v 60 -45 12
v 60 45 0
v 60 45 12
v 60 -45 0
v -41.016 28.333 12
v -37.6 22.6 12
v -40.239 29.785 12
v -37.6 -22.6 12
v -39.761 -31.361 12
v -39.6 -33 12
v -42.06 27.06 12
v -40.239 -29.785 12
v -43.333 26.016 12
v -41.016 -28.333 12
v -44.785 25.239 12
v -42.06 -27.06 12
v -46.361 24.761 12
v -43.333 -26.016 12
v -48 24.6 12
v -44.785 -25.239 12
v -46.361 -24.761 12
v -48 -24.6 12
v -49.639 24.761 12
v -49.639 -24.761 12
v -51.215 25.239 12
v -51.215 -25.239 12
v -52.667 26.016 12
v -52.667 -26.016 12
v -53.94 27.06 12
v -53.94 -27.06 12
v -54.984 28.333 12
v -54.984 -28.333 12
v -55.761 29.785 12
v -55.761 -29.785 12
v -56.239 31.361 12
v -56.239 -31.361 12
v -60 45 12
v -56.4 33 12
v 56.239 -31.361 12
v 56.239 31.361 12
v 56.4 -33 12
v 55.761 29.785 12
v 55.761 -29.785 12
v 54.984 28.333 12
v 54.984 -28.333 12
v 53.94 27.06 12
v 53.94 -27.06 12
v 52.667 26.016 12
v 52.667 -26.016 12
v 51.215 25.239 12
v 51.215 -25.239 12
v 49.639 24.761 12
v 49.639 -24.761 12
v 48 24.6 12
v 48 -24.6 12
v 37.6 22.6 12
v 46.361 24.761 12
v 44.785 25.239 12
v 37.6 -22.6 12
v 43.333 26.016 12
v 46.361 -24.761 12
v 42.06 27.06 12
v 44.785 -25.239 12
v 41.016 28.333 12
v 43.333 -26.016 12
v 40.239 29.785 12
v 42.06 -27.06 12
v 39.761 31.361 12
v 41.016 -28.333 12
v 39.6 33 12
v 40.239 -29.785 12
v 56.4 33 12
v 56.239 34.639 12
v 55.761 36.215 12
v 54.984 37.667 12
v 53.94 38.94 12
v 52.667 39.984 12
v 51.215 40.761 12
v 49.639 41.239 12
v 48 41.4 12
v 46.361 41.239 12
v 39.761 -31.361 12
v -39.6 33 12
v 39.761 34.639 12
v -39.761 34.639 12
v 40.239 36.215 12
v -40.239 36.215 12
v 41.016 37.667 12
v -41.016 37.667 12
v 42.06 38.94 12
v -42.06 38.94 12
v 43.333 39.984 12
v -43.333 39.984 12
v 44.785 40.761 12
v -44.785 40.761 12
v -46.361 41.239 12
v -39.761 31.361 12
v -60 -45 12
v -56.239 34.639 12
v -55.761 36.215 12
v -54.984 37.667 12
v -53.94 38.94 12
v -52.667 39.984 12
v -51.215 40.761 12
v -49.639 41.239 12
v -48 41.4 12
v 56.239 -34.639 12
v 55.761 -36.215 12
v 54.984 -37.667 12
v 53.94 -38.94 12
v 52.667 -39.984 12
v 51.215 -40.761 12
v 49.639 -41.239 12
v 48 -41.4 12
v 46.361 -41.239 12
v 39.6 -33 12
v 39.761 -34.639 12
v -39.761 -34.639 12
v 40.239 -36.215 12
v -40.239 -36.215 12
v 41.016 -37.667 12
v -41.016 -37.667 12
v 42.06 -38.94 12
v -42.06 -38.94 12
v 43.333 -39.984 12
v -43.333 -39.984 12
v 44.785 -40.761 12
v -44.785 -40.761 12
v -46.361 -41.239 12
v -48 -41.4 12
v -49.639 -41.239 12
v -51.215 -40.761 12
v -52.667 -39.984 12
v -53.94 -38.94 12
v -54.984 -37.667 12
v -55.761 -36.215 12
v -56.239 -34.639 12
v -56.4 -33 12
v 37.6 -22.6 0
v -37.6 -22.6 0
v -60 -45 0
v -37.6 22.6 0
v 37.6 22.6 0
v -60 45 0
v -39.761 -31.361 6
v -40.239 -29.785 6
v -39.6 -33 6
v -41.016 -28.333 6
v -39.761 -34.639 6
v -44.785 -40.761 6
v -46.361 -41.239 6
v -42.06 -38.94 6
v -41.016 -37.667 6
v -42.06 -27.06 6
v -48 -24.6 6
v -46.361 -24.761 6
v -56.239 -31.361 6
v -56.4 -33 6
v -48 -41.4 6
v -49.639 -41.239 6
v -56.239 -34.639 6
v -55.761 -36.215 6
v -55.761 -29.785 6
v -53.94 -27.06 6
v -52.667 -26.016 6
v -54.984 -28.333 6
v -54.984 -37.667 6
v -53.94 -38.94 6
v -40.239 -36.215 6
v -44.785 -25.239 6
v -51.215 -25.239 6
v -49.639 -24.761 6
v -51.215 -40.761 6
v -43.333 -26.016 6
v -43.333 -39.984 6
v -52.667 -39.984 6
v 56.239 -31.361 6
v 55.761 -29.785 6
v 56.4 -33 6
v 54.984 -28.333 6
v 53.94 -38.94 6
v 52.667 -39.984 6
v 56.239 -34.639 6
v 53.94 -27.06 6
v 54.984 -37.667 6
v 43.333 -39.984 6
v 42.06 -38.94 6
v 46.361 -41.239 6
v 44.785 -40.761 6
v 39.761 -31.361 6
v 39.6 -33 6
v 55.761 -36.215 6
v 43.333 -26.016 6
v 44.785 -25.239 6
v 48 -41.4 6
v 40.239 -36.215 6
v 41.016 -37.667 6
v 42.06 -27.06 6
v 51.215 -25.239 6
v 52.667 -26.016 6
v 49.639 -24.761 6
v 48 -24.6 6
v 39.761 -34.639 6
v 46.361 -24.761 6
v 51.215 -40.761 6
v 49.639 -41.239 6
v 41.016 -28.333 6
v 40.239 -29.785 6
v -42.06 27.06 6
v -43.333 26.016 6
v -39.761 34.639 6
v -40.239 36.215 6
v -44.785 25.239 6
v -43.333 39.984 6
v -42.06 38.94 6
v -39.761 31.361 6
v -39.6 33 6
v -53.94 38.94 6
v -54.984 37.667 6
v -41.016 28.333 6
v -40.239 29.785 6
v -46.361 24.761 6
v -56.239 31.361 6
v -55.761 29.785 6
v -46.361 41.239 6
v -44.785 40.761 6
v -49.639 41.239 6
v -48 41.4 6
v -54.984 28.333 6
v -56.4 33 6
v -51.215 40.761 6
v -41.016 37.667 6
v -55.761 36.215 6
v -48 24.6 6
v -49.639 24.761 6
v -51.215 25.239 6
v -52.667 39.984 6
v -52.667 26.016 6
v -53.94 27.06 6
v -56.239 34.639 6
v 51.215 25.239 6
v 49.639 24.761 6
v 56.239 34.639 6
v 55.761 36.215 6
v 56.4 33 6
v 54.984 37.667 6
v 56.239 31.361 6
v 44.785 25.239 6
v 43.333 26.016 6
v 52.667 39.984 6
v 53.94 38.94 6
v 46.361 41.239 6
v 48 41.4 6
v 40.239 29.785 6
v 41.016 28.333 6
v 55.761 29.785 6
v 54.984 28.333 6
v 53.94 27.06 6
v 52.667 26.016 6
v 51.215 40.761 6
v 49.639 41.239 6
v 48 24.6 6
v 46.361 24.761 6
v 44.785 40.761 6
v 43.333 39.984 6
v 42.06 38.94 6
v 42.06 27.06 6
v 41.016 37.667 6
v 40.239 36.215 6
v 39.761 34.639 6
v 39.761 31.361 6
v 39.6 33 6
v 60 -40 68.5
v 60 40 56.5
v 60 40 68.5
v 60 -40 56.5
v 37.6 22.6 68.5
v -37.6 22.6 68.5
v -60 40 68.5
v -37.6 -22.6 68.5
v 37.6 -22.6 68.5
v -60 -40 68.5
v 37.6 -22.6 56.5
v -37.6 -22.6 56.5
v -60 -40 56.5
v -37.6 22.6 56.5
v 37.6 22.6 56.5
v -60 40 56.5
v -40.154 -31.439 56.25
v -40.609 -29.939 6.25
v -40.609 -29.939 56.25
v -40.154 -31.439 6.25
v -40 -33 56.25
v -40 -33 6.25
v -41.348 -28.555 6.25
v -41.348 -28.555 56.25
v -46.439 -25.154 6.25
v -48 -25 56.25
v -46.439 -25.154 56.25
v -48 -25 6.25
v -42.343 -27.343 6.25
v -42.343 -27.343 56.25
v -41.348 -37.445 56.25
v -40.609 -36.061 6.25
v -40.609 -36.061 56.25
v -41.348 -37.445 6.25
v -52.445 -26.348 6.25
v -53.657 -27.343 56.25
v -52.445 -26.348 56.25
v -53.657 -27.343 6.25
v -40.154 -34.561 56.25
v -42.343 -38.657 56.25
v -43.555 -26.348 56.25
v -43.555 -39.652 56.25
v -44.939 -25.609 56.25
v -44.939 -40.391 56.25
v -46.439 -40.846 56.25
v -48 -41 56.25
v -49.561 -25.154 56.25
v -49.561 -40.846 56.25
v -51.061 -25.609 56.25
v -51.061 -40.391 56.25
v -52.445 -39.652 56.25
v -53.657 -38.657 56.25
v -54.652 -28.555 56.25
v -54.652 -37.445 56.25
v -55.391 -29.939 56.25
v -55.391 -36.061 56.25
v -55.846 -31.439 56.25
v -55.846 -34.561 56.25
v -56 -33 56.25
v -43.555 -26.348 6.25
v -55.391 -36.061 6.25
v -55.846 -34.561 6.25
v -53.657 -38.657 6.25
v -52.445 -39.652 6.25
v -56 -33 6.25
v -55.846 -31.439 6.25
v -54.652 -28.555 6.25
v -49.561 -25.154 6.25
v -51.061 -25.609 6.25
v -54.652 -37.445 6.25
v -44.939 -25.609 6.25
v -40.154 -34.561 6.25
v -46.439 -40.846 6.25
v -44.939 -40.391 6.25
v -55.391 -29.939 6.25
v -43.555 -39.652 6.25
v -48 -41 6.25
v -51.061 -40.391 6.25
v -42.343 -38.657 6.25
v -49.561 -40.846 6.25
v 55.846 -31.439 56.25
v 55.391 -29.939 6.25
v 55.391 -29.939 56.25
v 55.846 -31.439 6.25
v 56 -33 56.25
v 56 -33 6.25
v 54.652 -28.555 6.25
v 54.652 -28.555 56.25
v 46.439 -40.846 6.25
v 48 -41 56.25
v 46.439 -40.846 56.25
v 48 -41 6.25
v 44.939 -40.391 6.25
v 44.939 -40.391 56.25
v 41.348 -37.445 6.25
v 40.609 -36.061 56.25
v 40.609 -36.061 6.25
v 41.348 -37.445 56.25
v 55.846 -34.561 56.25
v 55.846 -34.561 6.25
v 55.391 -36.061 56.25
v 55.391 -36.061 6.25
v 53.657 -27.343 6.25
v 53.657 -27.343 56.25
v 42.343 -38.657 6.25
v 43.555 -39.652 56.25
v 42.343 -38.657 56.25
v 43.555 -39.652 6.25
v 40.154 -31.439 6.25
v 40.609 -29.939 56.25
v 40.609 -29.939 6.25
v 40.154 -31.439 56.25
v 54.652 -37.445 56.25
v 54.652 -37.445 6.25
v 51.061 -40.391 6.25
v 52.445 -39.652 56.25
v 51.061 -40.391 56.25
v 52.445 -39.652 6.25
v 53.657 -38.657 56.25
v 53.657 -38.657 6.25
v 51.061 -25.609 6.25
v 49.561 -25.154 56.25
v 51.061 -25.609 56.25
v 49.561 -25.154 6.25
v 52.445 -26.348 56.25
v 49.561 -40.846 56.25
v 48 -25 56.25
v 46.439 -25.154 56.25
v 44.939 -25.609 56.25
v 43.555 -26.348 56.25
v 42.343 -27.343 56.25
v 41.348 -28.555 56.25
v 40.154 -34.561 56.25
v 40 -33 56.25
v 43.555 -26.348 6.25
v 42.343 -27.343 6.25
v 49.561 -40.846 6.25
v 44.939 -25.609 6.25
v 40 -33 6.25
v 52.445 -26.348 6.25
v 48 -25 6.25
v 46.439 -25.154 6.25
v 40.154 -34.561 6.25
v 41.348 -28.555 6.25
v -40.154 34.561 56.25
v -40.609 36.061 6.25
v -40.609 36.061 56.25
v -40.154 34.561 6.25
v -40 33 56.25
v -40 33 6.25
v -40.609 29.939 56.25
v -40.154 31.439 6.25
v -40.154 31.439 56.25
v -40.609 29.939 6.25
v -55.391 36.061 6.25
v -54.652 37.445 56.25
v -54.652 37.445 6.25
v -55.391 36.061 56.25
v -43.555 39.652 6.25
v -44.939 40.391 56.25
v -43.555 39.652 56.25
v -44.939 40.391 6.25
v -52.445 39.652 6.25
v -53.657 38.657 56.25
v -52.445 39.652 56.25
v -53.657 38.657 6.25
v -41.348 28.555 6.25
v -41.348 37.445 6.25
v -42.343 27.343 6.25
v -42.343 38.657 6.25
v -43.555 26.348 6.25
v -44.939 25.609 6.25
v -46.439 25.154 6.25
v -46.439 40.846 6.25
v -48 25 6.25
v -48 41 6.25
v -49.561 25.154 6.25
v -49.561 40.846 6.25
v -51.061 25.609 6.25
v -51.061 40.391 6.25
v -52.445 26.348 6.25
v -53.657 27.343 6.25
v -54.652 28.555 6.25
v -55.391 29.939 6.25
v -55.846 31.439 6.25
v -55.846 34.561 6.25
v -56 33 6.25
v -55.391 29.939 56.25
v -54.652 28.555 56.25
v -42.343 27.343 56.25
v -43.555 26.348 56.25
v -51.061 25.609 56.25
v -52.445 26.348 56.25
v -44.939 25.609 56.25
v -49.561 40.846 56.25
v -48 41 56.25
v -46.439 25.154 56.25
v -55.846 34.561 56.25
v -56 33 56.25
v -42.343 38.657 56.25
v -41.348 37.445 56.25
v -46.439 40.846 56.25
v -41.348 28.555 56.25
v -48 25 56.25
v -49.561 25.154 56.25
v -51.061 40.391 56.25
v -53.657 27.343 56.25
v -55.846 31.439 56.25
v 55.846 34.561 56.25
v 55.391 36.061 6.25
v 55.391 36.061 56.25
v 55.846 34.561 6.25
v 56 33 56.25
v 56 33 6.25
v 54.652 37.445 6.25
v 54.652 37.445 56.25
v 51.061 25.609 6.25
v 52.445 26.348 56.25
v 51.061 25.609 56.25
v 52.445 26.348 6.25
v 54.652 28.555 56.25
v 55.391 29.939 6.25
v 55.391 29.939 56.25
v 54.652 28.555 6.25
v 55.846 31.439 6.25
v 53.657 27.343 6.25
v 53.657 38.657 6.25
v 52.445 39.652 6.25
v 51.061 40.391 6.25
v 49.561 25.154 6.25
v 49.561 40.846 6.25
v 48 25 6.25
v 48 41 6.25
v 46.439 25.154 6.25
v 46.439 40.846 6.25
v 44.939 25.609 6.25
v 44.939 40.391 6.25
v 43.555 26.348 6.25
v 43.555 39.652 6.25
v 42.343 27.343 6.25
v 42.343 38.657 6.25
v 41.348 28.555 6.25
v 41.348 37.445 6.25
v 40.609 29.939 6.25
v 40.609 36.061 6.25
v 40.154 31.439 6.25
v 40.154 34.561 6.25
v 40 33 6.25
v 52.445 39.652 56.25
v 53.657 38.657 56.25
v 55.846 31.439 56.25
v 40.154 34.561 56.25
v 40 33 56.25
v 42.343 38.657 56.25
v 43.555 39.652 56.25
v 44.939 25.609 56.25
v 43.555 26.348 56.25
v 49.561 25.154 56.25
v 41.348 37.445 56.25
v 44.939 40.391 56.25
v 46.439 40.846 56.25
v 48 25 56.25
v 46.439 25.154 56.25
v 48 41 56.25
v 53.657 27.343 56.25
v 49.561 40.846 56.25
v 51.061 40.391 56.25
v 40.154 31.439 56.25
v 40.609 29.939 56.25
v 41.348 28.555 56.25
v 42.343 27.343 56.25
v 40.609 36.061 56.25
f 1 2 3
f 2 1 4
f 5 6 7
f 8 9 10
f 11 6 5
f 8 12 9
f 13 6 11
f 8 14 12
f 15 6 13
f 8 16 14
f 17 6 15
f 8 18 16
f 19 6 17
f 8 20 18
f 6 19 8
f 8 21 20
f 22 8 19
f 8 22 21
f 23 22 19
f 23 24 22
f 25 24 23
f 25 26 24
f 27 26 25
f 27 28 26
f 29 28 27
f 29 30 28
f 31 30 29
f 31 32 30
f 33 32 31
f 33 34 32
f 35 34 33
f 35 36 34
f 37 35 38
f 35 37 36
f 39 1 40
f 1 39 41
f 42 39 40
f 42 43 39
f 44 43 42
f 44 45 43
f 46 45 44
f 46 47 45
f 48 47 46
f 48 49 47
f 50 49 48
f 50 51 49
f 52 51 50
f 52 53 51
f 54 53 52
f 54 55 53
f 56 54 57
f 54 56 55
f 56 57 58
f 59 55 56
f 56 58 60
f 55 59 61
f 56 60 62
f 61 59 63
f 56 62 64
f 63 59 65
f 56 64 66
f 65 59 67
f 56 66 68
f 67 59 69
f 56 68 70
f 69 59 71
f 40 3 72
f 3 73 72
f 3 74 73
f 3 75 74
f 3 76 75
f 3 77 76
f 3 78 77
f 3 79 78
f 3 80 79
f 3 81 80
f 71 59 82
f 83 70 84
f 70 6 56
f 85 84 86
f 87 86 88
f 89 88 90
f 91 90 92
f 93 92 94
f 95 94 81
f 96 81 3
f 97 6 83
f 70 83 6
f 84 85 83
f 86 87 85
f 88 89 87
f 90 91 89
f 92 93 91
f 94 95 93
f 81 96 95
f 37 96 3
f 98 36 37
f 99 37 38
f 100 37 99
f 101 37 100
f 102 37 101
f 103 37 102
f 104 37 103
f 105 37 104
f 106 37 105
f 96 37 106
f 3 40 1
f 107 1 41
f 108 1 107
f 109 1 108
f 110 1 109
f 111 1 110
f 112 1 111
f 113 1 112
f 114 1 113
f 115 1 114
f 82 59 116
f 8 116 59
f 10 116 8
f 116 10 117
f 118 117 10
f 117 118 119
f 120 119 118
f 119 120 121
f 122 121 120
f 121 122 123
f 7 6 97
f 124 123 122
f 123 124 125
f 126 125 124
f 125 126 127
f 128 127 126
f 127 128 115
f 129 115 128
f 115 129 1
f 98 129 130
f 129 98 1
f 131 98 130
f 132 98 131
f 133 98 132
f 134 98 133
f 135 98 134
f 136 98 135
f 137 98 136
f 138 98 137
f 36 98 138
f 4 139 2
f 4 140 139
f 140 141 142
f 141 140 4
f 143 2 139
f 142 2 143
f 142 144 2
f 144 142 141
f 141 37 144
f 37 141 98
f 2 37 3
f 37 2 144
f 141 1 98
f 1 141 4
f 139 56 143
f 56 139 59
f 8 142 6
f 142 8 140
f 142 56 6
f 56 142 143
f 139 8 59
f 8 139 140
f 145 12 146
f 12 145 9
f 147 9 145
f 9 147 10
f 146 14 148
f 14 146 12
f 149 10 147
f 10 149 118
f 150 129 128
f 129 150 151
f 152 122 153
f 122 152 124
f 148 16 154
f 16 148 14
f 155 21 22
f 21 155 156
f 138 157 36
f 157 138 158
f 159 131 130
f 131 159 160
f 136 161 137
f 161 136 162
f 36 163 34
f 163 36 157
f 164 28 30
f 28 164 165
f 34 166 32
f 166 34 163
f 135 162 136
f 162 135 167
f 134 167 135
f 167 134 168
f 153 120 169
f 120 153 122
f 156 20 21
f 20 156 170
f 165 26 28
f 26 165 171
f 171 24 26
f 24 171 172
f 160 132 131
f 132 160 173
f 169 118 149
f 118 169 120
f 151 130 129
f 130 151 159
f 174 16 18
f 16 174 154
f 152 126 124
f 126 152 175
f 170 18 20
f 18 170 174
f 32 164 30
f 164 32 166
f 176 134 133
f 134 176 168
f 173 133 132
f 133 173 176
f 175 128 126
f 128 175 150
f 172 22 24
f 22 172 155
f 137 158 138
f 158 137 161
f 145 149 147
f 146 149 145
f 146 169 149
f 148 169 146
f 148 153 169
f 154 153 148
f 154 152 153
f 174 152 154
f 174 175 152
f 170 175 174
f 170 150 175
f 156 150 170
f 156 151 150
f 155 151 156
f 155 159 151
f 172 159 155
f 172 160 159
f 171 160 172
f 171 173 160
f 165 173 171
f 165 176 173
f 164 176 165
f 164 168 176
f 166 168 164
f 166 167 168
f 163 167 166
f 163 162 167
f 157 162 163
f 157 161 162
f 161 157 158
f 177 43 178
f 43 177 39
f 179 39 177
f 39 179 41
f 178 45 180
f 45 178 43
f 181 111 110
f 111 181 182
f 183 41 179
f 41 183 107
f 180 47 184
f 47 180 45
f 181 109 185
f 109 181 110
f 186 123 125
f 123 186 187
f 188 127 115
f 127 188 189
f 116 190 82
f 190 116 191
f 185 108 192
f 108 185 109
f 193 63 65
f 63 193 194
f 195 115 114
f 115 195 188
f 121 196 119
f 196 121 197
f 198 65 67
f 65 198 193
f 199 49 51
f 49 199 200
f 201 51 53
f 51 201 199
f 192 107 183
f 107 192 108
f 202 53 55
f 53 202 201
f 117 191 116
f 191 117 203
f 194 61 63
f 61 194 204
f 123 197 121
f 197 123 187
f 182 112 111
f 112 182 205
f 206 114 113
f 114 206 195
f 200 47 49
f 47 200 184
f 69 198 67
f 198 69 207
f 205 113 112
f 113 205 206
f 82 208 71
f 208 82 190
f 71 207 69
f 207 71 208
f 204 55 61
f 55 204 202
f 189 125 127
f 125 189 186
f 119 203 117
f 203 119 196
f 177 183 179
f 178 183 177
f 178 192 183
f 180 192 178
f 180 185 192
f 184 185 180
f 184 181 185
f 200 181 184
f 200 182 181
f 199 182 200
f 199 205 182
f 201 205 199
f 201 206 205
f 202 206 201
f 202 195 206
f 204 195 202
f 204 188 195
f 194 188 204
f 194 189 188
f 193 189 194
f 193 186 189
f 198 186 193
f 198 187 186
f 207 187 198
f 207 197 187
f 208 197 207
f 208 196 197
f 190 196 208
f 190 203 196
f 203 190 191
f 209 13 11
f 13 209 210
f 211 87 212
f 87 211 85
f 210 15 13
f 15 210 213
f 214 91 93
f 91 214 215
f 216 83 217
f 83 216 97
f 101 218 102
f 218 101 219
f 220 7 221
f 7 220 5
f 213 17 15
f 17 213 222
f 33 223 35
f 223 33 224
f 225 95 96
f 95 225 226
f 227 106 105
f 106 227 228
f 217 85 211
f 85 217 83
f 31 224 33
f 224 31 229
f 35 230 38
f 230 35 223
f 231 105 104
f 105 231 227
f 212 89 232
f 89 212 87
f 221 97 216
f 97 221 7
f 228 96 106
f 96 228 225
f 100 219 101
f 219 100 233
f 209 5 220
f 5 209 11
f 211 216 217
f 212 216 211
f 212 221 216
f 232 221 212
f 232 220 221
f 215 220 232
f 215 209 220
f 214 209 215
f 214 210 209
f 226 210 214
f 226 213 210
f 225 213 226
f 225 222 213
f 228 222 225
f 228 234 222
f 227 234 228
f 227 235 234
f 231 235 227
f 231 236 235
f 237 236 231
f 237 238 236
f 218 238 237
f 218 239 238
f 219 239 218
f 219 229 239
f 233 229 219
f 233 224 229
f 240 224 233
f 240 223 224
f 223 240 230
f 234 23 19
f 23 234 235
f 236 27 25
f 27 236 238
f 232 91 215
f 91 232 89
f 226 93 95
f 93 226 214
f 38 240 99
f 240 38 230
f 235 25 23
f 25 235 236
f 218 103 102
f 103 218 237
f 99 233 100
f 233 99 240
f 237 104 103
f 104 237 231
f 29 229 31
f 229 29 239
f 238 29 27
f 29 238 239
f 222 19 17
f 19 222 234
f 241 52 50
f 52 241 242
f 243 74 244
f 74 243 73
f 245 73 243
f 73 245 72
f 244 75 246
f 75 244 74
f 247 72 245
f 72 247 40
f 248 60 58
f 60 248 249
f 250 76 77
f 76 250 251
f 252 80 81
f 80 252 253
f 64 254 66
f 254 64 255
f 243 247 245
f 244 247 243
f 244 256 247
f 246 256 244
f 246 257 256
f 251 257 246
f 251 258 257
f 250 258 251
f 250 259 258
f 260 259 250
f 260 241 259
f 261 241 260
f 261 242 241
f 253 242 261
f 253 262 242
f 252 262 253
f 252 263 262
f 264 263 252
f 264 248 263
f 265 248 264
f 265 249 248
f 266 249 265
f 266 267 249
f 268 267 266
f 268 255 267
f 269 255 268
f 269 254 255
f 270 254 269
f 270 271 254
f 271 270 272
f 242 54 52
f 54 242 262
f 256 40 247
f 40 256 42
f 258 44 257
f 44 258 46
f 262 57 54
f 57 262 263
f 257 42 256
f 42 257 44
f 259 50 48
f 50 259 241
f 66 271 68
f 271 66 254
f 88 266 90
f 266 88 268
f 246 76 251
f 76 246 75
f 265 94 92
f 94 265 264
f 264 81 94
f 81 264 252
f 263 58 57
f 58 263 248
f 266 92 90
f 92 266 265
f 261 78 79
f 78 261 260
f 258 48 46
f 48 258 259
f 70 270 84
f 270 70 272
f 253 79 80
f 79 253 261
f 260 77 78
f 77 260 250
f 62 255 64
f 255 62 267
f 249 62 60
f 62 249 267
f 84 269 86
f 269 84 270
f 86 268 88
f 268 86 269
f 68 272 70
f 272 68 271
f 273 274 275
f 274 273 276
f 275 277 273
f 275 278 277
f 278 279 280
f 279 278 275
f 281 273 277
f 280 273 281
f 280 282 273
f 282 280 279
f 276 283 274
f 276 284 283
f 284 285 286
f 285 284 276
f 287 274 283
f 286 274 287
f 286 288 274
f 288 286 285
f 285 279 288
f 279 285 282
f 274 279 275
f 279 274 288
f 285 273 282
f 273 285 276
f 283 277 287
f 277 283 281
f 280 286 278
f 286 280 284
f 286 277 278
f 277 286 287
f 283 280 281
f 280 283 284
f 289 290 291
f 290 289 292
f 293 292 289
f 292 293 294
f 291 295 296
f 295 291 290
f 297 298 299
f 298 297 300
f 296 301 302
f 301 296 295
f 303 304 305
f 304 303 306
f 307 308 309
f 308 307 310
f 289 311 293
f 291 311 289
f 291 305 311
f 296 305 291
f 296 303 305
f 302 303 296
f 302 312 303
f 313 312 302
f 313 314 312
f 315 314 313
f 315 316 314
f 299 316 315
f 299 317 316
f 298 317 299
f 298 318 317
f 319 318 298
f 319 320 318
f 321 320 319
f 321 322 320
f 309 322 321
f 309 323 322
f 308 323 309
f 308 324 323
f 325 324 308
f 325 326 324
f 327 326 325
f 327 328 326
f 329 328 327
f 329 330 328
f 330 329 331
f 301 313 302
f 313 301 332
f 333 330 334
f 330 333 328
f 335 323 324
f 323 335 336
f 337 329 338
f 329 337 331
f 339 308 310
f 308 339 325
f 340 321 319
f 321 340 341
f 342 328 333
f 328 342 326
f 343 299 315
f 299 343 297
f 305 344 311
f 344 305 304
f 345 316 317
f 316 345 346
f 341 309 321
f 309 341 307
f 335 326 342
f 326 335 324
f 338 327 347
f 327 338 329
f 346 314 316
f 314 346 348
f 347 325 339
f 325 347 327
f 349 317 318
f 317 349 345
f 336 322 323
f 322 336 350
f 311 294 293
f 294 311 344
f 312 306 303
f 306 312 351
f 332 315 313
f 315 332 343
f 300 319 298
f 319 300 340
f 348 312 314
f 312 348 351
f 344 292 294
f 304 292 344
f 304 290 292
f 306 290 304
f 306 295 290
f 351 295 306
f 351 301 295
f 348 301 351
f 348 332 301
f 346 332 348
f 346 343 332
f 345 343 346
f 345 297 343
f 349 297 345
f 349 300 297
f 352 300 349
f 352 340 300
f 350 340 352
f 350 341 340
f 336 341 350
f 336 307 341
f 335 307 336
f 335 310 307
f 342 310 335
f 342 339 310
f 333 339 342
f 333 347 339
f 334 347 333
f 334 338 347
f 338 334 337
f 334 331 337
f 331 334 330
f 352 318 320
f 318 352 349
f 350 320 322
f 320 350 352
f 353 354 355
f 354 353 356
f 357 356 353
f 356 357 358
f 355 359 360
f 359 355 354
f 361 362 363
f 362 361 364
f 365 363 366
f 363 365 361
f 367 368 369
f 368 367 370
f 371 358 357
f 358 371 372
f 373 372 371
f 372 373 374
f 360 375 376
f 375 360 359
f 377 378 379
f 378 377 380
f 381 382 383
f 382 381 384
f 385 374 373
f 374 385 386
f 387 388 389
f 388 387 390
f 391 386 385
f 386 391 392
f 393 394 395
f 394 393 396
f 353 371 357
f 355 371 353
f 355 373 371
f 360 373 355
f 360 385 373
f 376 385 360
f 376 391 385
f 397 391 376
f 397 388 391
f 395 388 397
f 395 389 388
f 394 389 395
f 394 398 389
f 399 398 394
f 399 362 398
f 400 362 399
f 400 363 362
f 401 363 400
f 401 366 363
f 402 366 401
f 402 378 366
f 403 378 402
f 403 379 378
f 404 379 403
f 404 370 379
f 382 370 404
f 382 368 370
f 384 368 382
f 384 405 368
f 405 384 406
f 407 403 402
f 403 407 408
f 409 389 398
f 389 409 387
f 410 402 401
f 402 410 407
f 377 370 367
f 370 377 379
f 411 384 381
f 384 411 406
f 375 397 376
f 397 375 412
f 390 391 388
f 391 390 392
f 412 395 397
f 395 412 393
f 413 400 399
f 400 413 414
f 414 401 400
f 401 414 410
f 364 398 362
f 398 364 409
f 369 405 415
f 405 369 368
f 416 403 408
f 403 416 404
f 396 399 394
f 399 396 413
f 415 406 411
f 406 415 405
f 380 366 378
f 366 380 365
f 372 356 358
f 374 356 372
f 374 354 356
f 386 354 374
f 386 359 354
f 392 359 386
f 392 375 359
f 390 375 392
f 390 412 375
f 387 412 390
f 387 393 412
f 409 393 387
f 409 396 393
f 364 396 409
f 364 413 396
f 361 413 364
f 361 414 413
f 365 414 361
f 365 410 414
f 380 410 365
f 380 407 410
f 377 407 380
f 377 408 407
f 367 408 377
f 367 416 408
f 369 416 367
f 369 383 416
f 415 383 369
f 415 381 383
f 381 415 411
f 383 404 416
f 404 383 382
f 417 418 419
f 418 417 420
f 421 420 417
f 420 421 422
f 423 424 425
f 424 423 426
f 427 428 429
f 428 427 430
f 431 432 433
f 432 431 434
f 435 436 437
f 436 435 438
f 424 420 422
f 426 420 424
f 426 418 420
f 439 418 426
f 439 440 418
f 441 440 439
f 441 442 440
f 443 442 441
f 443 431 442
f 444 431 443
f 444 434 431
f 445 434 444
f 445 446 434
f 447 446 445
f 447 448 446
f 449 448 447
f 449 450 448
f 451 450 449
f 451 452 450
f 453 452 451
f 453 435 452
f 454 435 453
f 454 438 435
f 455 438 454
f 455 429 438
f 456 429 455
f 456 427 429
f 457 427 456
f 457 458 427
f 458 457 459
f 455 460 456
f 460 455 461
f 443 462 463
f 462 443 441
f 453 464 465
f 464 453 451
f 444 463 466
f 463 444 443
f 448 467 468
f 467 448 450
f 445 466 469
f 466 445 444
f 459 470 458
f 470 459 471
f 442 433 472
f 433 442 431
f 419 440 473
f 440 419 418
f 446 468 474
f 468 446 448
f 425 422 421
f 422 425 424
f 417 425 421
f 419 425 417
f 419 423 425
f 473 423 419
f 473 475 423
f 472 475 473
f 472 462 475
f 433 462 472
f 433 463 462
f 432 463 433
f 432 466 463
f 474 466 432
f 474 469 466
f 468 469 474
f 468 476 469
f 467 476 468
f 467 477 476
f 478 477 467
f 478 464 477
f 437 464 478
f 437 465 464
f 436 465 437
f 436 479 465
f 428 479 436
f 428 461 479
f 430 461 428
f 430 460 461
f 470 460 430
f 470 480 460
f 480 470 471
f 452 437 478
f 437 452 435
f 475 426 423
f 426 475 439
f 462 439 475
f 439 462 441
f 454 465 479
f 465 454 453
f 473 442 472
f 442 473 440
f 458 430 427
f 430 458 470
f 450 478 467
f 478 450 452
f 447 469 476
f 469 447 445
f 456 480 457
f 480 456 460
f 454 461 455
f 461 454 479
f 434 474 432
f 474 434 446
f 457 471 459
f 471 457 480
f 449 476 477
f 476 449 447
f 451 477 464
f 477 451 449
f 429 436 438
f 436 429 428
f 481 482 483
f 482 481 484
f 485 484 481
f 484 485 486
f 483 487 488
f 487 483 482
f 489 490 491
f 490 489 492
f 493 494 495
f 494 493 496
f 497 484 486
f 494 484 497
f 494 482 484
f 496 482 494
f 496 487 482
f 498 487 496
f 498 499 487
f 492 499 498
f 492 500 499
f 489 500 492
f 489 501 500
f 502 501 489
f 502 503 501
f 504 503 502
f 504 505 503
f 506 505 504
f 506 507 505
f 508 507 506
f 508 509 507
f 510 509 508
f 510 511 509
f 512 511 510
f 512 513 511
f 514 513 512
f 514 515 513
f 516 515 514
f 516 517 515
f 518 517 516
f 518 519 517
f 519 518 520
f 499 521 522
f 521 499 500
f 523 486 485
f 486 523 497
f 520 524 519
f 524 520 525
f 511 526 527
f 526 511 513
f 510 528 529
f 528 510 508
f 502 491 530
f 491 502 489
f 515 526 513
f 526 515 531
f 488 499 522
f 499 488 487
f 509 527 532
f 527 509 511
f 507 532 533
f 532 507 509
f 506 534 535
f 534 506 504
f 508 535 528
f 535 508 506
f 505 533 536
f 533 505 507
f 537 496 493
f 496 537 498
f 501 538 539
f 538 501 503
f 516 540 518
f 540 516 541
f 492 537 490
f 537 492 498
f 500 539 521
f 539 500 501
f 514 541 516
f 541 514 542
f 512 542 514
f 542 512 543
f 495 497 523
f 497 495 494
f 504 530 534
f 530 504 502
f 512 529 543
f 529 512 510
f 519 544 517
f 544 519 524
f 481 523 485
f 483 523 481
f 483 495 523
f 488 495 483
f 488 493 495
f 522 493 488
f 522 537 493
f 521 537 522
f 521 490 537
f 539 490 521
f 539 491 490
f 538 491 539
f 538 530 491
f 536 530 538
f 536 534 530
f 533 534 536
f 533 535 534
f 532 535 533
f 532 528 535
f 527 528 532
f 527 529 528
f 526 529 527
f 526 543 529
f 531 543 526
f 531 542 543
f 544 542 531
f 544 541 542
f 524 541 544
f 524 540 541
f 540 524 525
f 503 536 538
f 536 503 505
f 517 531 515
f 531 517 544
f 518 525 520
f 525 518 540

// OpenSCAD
$fn = 32;

// ------------------------------------------------------------------------
// Frame cube: base 120 x 90 mm, posts 50 mm tall
// Every part is its own module, assembly() places every instance.
// ------------------------------------------------------------------------

// --- part 1 ---
module base_frame() {
  difference() {
    translate([-60, -45, 0]) cube([120, 90, 12]);
    translate([-37.6, -22.6, -1]) cube([75.2, 45.2, 14]);
    translate([-48, -33, 6]) cylinder(h = 7, d = 16.8);
    translate([48, -33, 6]) cylinder(h = 7, d = 16.8);
    translate([-48, 33, 6]) cylinder(h = 7, d = 16.8);
    translate([48, 33, 6]) cylinder(h = 7, d = 16.8);
  }
}

// --- part 2 ---
module corner_post() {
  cylinder(h = 50, d = 16);
}

// --- part 3 ---
module top_frame() {
  difference() {
    translate([-60, -40, 0]) cube([120, 80, 12]);
    translate([-37.6, -22.6, -1]) cube([75.2, 45.2, 14]);
  }
}

// --- assembly ---
module assembly() {
  color([0.80, 0.24, 0.20]) translate([0, 0, 0]) rotate([0, 0, 0]) base_frame();
  color([0.20, 0.45, 0.75]) translate([-48, -33, 6.25]) rotate([0, 0, 0]) corner_post();
  color([0.25, 0.62, 0.32]) translate([48, -33, 6.25]) rotate([0, 0, 0]) corner_post();
  color([0.92, 0.70, 0.18]) translate([-48, 33, 6.25]) rotate([0, 0, 0]) corner_post();
  color([0.58, 0.35, 0.70]) translate([48, 33, 6.25]) rotate([0, 0, 0]) corner_post();
  color([0.16, 0.66, 0.66]) translate([0, 0, 56.5]) rotate([0, 0, 0]) top_frame();
}

assembly();
